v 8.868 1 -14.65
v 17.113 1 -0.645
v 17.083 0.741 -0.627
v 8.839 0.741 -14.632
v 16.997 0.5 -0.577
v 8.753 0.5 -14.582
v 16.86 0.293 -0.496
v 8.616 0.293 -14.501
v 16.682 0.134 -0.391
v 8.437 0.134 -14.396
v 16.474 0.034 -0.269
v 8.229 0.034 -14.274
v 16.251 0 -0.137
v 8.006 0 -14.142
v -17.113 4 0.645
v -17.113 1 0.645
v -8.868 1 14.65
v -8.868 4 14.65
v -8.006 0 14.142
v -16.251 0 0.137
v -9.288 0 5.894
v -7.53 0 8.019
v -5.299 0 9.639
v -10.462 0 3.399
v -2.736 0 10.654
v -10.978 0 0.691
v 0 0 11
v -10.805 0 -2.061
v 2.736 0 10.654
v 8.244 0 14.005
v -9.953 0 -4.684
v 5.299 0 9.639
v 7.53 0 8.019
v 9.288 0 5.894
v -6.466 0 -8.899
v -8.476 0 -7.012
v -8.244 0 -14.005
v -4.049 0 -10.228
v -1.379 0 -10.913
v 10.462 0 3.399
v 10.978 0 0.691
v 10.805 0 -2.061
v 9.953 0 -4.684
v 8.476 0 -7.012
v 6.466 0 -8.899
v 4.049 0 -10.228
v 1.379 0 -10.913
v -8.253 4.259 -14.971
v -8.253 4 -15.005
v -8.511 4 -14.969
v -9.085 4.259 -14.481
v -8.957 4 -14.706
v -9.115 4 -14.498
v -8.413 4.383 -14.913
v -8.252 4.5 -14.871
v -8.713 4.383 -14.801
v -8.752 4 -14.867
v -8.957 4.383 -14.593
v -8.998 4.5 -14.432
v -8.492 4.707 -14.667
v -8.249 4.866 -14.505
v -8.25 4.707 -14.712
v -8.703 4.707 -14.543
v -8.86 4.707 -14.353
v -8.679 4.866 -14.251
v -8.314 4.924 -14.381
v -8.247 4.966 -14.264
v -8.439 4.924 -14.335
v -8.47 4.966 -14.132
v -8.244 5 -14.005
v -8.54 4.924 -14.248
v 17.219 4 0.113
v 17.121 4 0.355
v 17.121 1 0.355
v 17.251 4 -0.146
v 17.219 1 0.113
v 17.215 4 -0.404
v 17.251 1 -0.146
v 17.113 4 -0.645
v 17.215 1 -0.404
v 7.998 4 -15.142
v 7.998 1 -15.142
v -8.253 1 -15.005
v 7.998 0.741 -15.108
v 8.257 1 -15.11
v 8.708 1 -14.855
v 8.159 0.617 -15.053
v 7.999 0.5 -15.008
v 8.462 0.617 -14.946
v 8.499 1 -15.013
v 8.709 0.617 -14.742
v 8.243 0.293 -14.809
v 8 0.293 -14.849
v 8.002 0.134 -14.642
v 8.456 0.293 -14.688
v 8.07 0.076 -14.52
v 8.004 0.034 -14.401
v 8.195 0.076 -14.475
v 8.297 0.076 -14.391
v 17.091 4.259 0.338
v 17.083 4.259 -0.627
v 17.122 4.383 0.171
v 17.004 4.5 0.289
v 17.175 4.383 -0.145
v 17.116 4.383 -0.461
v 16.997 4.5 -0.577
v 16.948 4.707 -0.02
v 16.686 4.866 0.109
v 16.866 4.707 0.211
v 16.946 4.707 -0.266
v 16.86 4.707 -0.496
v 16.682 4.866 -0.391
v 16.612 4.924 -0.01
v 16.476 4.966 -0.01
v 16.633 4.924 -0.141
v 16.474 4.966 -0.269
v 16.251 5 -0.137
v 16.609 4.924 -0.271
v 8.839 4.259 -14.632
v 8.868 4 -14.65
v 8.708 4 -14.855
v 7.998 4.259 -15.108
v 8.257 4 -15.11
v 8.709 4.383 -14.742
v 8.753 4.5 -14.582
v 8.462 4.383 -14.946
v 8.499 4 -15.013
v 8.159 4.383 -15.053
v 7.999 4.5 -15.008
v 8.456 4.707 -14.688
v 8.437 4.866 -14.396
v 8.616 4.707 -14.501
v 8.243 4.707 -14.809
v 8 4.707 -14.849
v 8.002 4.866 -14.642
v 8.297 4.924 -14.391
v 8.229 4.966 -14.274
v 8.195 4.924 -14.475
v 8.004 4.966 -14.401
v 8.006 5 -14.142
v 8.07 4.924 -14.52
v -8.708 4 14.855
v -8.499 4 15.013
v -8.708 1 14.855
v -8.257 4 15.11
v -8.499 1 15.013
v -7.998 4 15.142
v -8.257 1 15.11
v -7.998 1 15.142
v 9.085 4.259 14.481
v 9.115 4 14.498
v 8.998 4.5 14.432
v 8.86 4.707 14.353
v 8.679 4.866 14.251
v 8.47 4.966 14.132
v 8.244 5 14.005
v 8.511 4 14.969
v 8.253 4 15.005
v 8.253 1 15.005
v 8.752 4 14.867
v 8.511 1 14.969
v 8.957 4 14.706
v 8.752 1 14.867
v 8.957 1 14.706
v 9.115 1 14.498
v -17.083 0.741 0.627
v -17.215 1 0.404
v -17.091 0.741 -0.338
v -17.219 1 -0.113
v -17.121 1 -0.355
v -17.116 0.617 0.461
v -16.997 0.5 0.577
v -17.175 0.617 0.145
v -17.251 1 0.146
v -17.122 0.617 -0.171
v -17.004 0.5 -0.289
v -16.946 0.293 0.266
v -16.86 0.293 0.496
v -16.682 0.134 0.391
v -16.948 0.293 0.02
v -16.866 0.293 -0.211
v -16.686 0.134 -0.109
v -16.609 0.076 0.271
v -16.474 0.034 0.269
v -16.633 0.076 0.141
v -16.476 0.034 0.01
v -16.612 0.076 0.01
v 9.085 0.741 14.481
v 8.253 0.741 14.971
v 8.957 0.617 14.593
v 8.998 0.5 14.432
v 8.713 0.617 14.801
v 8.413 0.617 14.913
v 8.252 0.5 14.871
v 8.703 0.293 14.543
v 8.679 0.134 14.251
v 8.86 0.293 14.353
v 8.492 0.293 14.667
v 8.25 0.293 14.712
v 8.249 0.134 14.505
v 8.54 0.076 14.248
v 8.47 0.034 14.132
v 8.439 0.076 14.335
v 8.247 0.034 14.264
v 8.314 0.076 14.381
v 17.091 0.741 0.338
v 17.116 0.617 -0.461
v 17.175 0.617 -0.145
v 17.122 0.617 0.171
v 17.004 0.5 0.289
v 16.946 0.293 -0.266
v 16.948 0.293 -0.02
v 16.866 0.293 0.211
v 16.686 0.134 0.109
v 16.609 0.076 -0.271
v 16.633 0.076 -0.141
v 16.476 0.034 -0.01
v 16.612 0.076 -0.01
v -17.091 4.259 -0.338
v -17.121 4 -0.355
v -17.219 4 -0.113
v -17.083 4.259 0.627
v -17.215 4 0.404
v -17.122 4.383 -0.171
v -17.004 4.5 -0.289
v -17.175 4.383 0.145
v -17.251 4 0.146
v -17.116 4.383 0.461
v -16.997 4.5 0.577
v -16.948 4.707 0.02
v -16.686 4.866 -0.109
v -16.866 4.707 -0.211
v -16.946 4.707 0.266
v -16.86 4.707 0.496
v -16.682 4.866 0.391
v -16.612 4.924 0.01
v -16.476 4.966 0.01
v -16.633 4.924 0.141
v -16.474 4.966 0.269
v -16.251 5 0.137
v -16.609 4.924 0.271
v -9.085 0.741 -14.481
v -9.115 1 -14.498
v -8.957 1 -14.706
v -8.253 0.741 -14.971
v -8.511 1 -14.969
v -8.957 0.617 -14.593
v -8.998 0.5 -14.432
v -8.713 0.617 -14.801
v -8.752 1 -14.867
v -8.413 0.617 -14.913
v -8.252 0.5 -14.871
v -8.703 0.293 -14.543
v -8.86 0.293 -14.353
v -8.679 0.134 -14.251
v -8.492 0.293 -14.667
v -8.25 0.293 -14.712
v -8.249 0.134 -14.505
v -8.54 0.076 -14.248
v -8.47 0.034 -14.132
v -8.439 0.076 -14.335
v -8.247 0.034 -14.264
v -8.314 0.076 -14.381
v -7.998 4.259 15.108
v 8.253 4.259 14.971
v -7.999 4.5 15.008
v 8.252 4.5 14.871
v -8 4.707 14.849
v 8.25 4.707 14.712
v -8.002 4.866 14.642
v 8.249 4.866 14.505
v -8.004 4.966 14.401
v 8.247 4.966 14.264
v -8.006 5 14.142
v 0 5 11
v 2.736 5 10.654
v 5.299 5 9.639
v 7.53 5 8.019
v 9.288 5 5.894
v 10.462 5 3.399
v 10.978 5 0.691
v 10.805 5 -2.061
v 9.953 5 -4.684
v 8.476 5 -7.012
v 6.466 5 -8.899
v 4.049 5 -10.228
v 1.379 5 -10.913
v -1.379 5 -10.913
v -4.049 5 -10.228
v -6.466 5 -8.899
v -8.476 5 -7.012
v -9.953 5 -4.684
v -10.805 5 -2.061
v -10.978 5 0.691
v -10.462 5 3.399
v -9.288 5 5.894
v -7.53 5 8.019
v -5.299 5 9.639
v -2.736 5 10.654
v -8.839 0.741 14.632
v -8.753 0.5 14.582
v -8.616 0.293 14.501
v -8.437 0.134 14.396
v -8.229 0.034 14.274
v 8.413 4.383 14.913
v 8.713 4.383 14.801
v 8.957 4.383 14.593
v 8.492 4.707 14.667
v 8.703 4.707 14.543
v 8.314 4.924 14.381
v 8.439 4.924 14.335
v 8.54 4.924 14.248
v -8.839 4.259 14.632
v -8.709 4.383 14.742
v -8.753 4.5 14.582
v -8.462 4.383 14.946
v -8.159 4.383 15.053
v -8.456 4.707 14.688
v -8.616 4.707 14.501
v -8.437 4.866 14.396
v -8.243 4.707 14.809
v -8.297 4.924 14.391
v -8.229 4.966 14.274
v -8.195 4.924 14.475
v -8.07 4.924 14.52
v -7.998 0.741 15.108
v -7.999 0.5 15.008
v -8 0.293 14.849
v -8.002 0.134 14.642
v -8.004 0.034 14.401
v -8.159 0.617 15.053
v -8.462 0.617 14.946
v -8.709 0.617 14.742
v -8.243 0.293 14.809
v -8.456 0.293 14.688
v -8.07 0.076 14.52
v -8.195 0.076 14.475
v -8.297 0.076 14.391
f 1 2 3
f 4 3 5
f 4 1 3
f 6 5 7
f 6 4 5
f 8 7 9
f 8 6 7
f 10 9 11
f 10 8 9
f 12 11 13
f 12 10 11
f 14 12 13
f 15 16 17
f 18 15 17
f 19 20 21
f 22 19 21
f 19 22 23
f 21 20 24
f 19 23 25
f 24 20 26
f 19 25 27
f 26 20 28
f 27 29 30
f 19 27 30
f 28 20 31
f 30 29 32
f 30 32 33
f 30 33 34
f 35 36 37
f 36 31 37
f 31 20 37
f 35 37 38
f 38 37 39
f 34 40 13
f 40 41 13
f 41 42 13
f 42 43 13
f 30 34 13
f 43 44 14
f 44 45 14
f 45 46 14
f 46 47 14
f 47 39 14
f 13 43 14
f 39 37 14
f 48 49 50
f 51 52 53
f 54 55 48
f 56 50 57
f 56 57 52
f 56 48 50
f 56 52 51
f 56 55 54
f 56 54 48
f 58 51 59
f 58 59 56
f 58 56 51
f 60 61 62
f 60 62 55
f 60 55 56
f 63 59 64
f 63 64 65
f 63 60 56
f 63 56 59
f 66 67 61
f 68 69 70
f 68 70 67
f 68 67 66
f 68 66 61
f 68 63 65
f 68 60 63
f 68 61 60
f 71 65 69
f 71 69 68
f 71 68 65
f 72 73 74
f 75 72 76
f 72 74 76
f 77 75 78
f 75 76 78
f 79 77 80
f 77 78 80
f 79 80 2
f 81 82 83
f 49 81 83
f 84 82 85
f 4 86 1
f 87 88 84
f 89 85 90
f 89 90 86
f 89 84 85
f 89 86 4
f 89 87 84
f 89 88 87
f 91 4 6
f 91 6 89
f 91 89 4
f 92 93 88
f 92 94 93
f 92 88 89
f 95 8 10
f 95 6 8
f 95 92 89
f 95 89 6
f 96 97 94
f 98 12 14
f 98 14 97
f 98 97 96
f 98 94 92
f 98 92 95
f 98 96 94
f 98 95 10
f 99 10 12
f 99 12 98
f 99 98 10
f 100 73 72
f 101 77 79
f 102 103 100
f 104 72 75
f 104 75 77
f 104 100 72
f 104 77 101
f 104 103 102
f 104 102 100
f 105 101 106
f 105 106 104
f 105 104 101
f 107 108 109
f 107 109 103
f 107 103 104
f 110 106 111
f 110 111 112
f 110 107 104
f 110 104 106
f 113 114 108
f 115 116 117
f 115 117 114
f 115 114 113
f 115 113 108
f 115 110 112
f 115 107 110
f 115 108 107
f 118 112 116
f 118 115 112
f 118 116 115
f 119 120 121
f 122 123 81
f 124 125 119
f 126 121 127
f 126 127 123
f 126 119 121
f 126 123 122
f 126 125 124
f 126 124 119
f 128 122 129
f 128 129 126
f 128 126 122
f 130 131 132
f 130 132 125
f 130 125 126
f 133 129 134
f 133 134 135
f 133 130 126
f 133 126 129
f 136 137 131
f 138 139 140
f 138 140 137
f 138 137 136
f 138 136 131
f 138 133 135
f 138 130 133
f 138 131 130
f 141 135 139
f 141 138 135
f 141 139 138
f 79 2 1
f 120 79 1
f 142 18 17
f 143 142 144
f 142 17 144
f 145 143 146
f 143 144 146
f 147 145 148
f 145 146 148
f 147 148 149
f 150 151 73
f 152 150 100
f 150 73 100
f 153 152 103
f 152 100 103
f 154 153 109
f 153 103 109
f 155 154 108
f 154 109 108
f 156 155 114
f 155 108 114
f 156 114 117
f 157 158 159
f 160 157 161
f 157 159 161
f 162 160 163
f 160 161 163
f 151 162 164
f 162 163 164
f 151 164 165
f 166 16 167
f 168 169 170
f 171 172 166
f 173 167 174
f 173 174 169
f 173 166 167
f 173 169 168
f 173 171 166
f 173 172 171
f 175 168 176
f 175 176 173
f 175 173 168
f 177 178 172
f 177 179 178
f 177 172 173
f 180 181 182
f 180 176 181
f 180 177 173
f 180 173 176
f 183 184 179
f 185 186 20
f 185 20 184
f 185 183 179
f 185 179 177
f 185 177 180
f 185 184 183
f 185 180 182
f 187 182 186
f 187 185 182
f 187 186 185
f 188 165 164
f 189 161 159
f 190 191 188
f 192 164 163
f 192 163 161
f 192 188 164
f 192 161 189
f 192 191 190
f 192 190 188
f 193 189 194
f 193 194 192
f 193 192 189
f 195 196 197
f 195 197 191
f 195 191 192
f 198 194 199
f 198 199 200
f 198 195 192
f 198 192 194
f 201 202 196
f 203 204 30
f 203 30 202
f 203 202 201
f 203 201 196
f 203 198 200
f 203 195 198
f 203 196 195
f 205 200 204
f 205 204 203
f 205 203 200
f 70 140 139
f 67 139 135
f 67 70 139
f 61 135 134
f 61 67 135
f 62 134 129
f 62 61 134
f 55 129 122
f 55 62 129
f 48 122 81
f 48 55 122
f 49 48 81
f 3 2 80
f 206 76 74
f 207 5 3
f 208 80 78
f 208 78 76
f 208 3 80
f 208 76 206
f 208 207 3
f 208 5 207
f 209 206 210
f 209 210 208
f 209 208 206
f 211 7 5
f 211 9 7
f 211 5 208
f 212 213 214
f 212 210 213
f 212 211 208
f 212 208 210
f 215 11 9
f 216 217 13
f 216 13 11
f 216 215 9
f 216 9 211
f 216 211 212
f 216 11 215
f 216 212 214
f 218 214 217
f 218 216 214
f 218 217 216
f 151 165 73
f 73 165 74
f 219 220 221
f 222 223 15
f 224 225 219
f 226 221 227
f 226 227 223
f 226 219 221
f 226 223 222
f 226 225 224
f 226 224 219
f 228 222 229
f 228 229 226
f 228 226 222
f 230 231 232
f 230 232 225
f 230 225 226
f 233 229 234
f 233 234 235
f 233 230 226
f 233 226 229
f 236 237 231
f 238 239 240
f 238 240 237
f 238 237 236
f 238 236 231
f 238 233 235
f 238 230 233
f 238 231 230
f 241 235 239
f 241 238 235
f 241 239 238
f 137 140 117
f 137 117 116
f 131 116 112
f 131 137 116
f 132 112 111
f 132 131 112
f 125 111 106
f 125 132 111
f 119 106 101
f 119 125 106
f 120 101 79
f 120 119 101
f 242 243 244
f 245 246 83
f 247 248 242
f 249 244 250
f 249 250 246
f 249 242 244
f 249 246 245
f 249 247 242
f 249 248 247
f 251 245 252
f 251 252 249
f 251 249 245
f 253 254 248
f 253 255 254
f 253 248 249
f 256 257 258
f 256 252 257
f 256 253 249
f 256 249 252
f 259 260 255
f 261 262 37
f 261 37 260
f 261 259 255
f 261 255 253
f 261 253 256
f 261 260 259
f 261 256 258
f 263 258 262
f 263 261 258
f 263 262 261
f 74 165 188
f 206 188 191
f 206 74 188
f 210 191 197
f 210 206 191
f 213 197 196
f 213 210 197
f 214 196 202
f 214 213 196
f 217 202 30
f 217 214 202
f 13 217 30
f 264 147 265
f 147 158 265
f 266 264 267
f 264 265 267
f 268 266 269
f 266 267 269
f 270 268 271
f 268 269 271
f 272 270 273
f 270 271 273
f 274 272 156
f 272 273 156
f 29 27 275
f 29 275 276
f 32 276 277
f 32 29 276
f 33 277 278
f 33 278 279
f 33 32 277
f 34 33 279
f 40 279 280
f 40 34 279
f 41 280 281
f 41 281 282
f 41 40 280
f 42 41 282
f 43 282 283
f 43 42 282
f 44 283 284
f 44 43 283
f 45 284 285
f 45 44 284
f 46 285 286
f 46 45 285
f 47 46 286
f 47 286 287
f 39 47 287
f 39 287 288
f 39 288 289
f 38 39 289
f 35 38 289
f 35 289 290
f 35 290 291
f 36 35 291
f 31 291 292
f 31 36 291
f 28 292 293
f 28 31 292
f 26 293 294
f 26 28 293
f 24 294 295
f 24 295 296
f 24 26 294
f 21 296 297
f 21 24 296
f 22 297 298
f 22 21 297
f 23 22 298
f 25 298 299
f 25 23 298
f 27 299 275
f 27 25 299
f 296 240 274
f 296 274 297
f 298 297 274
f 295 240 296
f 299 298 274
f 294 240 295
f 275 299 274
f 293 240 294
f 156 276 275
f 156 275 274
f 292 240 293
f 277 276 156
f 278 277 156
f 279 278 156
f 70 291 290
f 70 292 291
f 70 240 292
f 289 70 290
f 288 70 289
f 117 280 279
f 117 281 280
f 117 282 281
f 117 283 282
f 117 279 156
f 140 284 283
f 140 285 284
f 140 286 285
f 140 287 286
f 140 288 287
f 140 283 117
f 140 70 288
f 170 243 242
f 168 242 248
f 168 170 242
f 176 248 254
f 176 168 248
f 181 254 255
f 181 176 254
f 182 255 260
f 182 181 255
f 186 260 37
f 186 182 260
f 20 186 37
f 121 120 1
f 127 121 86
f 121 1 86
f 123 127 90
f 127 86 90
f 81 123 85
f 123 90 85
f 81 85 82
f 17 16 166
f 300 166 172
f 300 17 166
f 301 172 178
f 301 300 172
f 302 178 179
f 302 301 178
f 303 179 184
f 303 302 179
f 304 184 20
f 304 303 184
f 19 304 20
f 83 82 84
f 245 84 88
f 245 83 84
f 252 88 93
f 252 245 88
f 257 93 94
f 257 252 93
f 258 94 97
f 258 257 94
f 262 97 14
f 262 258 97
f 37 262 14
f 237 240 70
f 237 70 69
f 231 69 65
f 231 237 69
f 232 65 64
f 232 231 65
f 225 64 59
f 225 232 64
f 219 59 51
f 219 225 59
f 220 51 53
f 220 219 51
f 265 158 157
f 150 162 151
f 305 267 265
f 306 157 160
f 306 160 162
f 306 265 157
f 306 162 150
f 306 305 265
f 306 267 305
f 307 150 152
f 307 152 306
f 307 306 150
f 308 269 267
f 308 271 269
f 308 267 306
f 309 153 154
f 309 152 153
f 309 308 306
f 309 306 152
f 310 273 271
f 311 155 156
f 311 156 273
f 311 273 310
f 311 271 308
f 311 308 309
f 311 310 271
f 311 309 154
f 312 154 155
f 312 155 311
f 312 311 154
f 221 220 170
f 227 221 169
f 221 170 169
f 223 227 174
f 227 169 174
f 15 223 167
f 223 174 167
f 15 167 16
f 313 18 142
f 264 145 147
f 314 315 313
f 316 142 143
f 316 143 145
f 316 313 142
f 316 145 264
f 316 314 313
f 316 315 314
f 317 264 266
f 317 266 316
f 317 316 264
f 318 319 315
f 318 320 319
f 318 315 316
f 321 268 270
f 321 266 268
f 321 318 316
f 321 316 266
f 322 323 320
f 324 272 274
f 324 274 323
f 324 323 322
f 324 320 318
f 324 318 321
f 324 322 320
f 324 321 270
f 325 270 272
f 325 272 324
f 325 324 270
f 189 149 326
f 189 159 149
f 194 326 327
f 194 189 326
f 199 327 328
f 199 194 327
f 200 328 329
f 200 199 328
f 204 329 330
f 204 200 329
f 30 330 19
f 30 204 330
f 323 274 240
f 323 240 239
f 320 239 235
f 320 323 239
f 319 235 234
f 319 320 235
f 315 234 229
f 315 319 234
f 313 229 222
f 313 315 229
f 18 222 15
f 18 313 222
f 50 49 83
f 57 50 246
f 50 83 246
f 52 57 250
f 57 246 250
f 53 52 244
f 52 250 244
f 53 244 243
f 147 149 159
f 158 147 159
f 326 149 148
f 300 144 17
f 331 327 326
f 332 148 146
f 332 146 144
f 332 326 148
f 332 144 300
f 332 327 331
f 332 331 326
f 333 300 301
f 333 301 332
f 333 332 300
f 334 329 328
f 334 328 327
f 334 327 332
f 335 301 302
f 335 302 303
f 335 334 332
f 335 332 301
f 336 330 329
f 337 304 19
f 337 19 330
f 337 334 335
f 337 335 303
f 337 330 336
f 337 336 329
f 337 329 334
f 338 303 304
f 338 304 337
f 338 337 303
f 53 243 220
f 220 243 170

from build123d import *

# Parameters (mm, degrees)
SKETCH1_R           = 11
BOSS_EXTRUDE1_DEPTH = 5
FILLET1_R           = 1
FILLET2_R           = 1
FILLET3_R           = 1
FILLET4_R           = 1
FILLET5_R           = 1
FILLET6_R           = 1
FILLET7_R           = 1
FILLET8_R           = 1


with BuildPart() as part:
    # Sketch1 → Boss-Extrude1 (new body)
    with BuildSketch(Plane(origin=(0, 0, 0), x_dir=(1, 0, 0), z_dir=(0, 1, 0))):
        Polygon((8.83016903, -15), (17.405465572, 0.1471507), (8.575296542, 15.1471507), (-8.83016903, 15), (-17.405465572, -0.1471507), (-8.575296542, -15.1471507), align=None)
        with Locations(Location((0, 0, 0), (0, 0, 270))):
            Circle(SKETCH1_R, mode=Mode.SUBTRACT)
    extrude(amount=BOSS_EXTRUDE1_DEPTH)

    # Fillet1
    fillet1_edges = [part.edges().sort_by_distance(p)[0] for p in [
        (-12.990381057, 0, 7.6471507),
        (-13.117817301, 0, -7.42642465),
        (-0.127436244, 0, -15.07357535),
        (12.990381057, 0, -7.6471507),
        (13.117817301, 0, 7.42642465),
        (0.127436244, 0, 15.07357535),
    ]]
    fillet(fillet1_edges, radius=FILLET1_R)

    # Fillet2
    fillet2_edges = [part.edges().sort_by_distance(p)[0] for p in [
        (12.990381057, 5, -7.6471507),
        (-0.127436244, 5, -15.07357535),
        (-13.117817301, 5, -7.42642465),
        (-12.990381057, 5, 7.6471507),
        (0.127436244, 5, 15.07357535),
        (13.117817301, 5, 7.42642465),
    ]]
    fillet(fillet2_edges, radius=FILLET2_R)

    # Fillet3
    # the kernel refuses this fillet: 1 mm, written as the material it takes off along each edge
    with BuildSketch(Plane(origin=(8.244385414, 1, 14.004916643), x_dir=(0.870221445448491, 0, 0.4926607716081514), z_dir=(0, -1, 0))) as fillet3_piece_1_section:
        Polygon((0, 0), (FILLET3_R, 0), (FILLET3_R, FILLET3_R * 0.57735026919), (FILLET3_R * 0.5, FILLET3_R * 0.866025403784), align=None)
    fillet3_piece_1 = extrude(amount=FILLET3_R, mode=Mode.PRIVATE)
    fillet3_piece_1 = fillet3_piece_1 - Plane(origin=(8.244385414, 1, 14.004916643), x_dir=(-0.5073034928723316, 0, -0.8617674663849478), z_dir=(0, -1, 0)) * Sphere(FILLET3_R, mode=Mode.PRIVATE)
    add(fillet3_piece_1, mode=Mode.SUBTRACT)
    with BuildSketch(Plane(origin=(8.244385414, 4, 14.004916643), x_dir=(0.870221445448491, 0, 0.4926607716081514), z_dir=(0, 1, 0))) as fillet3_piece_2_section:
        Polygon((0, 0), (FILLET3_R, 0), (FILLET3_R, -FILLET3_R * 0.57735026919), (FILLET3_R * 0.5, -FILLET3_R * 0.866025403784), align=None)
    fillet3_piece_2 = extrude(amount=FILLET3_R, mode=Mode.PRIVATE)
    fillet3_piece_2 = fillet3_piece_2 - Plane(origin=(8.244385414, 4, 14.004916643), x_dir=(-0.5073034928723316, 0, -0.8617674663849478), z_dir=(0, 1, 0)) * Sphere(FILLET3_R, mode=Mode.PRIVATE)
    add(fillet3_piece_2, mode=Mode.SUBTRACT)
    with BuildSketch(Plane(origin=(8.83016903, 1, 15), x_dir=(0.4926607716081517, 0, -0.8702214454484907), z_dir=(0, 1, 0))) as fillet3_piece_3:
        with BuildLine():
            CenterArc((FILLET3_R * 0.57735026919, FILLET3_R), FILLET3_R, 210, 60)
            Line((-FILLET3_R * 0.288675134595, FILLET3_R * 0.5), (0, 0))
            Line((0, 0), (FILLET3_R * 0.57735026919, 0))
        make_face()
    extrude(amount=3, mode=Mode.SUBTRACT)

    # Fillet4
    # the kernel refuses this fillet: 1 mm, written as the material it takes off along each edge
    with BuildSketch(Plane(origin=(-8.006420883, 1, 14.142305528), x_dir=(0.008453979063543083, 0, 0.999964264480483), z_dir=(0, -1, 0))) as fillet4_piece_1_section:
        Polygon((0, 0), (FILLET4_R, 0), (FILLET4_R, FILLET4_R * 0.57735026919), (FILLET4_R * 0.5, FILLET4_R * 0.866025403784), align=None)
    fillet4_piece_1 = extrude(amount=FILLET4_R, mode=Mode.PRIVATE)
    fillet4_piece_1 = fillet4_piece_1 - Plane(origin=(-8.006420883, 1, 14.142305528), x_dir=(0.49266077160815147, 0, -0.870221445448491), z_dir=(0, -1, 0)) * Sphere(FILLET4_R, mode=Mode.PRIVATE)
    add(fillet4_piece_1, mode=Mode.SUBTRACT)
    with BuildSketch(Plane(origin=(-8.006420883, 4, 14.142305528), x_dir=(0.008453979063543083, 0, 0.999964264480483), z_dir=(0, 1, 0))) as fillet4_piece_2_section:
        Polygon((0, 0), (FILLET4_R, 0), (FILLET4_R, -FILLET4_R * 0.57735026919), (FILLET4_R * 0.5, -FILLET4_R * 0.866025403784), align=None)
    fillet4_piece_2 = extrude(amount=FILLET4_R, mode=Mode.PRIVATE)
    fillet4_piece_2 = fillet4_piece_2 - Plane(origin=(-8.006420883, 4, 14.142305528), x_dir=(0.49266077160815147, 0, -0.870221445448491), z_dir=(0, 1, 0)) * Sphere(FILLET4_R, mode=Mode.PRIVATE)
    add(fillet4_piece_2, mode=Mode.SUBTRACT)
    with BuildSketch(Plane(origin=(-8.575296542, 1, 15.1471507), x_dir=(0.9999642644804829, 0, -0.008453979063542578), z_dir=(0, 1, 0))) as fillet4_piece_3:
        with BuildLine():
            CenterArc((FILLET4_R * 0.57735026919, FILLET4_R), FILLET4_R, 210, 60)
            Line((-FILLET4_R * 0.288675134595, FILLET4_R * 0.5), (0, 0))
            Line((0, 0), (FILLET4_R * 0.57735026919, 0))
        make_face()
    extrude(amount=3, mode=Mode.SUBTRACT)

    # Fillet5
    # the kernel refuses this fillet: 1 mm, written as the material it takes off along each edge
    with BuildSketch(Plane(origin=(-16.250806297, 1, 0.137388886), x_dir=(-0.870221445448491, 0, -0.49266077160815136), z_dir=(0, -1, 0))) as fillet5_piece_1_section:
        Polygon((0, 0), (FILLET5_R, 0), (FILLET5_R, -FILLET5_R * 0.57735026919), (FILLET5_R * 0.5, -FILLET5_R * 0.866025403784), align=None)
    fillet5_piece_1 = extrude(amount=FILLET5_R, mode=Mode.PRIVATE)
    fillet5_piece_1 = fillet5_piece_1 - Plane(origin=(-16.250806297, 1, 0.137388886), x_dir=(0.9999642644804829, 0, -0.008453979063543034), z_dir=(0, -1, 0)) * Sphere(FILLET5_R, mode=Mode.PRIVATE)
    add(fillet5_piece_1, mode=Mode.SUBTRACT)
    with BuildSketch(Plane(origin=(-16.250806297, 4, 0.137388886), x_dir=(-0.870221445448491, 0, -0.49266077160815136), z_dir=(0, 1, 0))) as fillet5_piece_2_section:
        Polygon((0, 0), (FILLET5_R, 0), (FILLET5_R, FILLET5_R * 0.57735026919), (FILLET5_R * 0.5, FILLET5_R * 0.866025403784), align=None)
    fillet5_piece_2 = extrude(amount=FILLET5_R, mode=Mode.PRIVATE)
    fillet5_piece_2 = fillet5_piece_2 - Plane(origin=(-16.250806297, 4, 0.137388886), x_dir=(0.9999642644804829, 0, -0.008453979063543034), z_dir=(0, 1, 0)) * Sphere(FILLET5_R, mode=Mode.PRIVATE)
    add(fillet5_piece_2, mode=Mode.SUBTRACT)
    with BuildSketch(Plane(origin=(-17.405465572, 1, 0.1471507), x_dir=(0.4926607716081488, 0, -0.8702214454484924), z_dir=(0, 1, 0))) as fillet5_piece_3:
        with BuildLine():
            CenterArc((FILLET5_R * 0.57735026919, -FILLET5_R), FILLET5_R, 90, 60)
            Line((-FILLET5_R * 0.288675134595, -FILLET5_R * 0.5), (0, 0))
            Line((0, 0), (FILLET5_R * 0.57735026919, 0))
        make_face()
    extrude(amount=3, mode=Mode.SUBTRACT)

    # Fillet6
    # the kernel refuses this fillet: 1 mm, written as the material it takes off along each edge
    with BuildSketch(Plane(origin=(-8.244385414, 1, -14.004916643), x_dir=(-0.008453979063543077, 0, -0.9999642644804829), z_dir=(0, -1, 0))) as fillet6_piece_1_section:
        Polygon((0, 0), (FILLET6_R, 0), (FILLET6_R, -FILLET6_R * 0.57735026919), (FILLET6_R * 0.5, -FILLET6_R * 0.866025403784), align=None)
    fillet6_piece_1 = extrude(amount=FILLET6_R, mode=Mode.PRIVATE)
    fillet6_piece_1 = fillet6_piece_1 - Plane(origin=(-8.244385414, 1, -14.004916643), x_dir=(0.5073034928723316, 0, 0.8617674663849478), z_dir=(0, -1, 0)) * Sphere(FILLET6_R, mode=Mode.PRIVATE)
    add(fillet6_piece_1, mode=Mode.SUBTRACT)
    with BuildSketch(Plane(origin=(-8.244385414, 4, -14.004916643), x_dir=(-0.008453979063543077, 0, -0.9999642644804829), z_dir=(0, 1, 0))) as fillet6_piece_2_section:
        Polygon((0, 0), (FILLET6_R, 0), (FILLET6_R, FILLET6_R * 0.57735026919), (FILLET6_R * 0.5, FILLET6_R * 0.866025403784), align=None)
    fillet6_piece_2 = extrude(amount=FILLET6_R, mode=Mode.PRIVATE)
    fillet6_piece_2 = fillet6_piece_2 - Plane(origin=(-8.244385414, 4, -14.004916643), x_dir=(0.5073034928723316, 0, 0.8617674663849478), z_dir=(0, 1, 0)) * Sphere(FILLET6_R, mode=Mode.PRIVATE)
    add(fillet6_piece_2, mode=Mode.SUBTRACT)
    with BuildSketch(Plane(origin=(-8.83016903, 1, -15), x_dir=(0.9999642644804829, 0, -0.008453979063542578), z_dir=(0, 1, 0))) as fillet6_piece_3:
        with BuildLine():
            CenterArc((FILLET6_R * 0.57735026919, -FILLET6_R), FILLET6_R, 90, 60)
            Line((-FILLET6_R * 0.288675134595, -FILLET6_R * 0.5), (0, 0))
            Line((0, 0), (FILLET6_R * 0.57735026919, 0))
        make_face()
    extrude(amount=3, mode=Mode.SUBTRACT)

    # Fillet7
    # the kernel refuses this fillet: 1 mm, written as the material it takes off along each edge
    with BuildSketch(Plane(origin=(8.006420883, 1, -14.142305528), x_dir=(0.8617674663849478, 0, -0.5073034928723317), z_dir=(0, -1, 0))) as fillet7_piece_1_section:
        Polygon((0, 0), (FILLET7_R, 0), (FILLET7_R, -FILLET7_R * 0.57735026919), (FILLET7_R * 0.5, -FILLET7_R * 0.866025403784), align=None)
    fillet7_piece_1 = extrude(amount=FILLET7_R, mode=Mode.PRIVATE)
    fillet7_piece_1 = fillet7_piece_1 - Plane(origin=(8.006420883, 1, -14.142305528), x_dir=(-0.4926607716081513, 0, 0.870221445448491), z_dir=(0, -1, 0)) * Sphere(FILLET7_R, mode=Mode.PRIVATE)
    add(fillet7_piece_1, mode=Mode.SUBTRACT)
    with BuildSketch(Plane(origin=(8.006420883, 4, -14.142305528), x_dir=(0.8617674663849478, 0, -0.5073034928723317), z_dir=(0, 1, 0))) as fillet7_piece_2_section:
        Polygon((0, 0), (FILLET7_R, 0), (FILLET7_R, FILLET7_R * 0.57735026919), (FILLET7_R * 0.5, FILLET7_R * 0.866025403784), align=None)
    fillet7_piece_2 = extrude(amount=FILLET7_R, mode=Mode.PRIVATE)
    fillet7_piece_2 = fillet7_piece_2 - Plane(origin=(8.006420883, 4, -14.142305528), x_dir=(-0.4926607716081513, 0, 0.870221445448491), z_dir=(0, 1, 0)) * Sphere(FILLET7_R, mode=Mode.PRIVATE)
    add(fillet7_piece_2, mode=Mode.SUBTRACT)
    with BuildSketch(Plane(origin=(8.575296542, 1, -15.1471507), x_dir=(0.507303492872331, 0, 0.8617674663849483), z_dir=(0, 1, 0))) as fillet7_piece_3:
        with BuildLine():
            CenterArc((FILLET7_R * 0.57735026919, -FILLET7_R), FILLET7_R, 90, 60)
            Line((-FILLET7_R * 0.288675134595, -FILLET7_R * 0.5), (0, 0))
            Line((0, 0), (FILLET7_R * 0.57735026919, 0))
        make_face()
    extrude(amount=3, mode=Mode.SUBTRACT)

    # Fillet8
    # the kernel refuses this fillet: 1 mm, written as the material it takes off along each edge
    with BuildSketch(Plane(origin=(16.250806297, 1, -0.137388886), x_dir=(0.870221445448491, 0, 0.4926607716081514), z_dir=(0, -1, 0))) as fillet8_piece_1_section:
        Polygon((0, 0), (FILLET8_R, 0), (FILLET8_R, -FILLET8_R * 0.57735026919), (FILLET8_R * 0.5, -FILLET8_R * 0.866025403784), align=None)
    fillet8_piece_1 = extrude(amount=FILLET8_R, mode=Mode.PRIVATE)
    fillet8_piece_1 = fillet8_piece_1 - Plane(origin=(16.250806297, 1, -0.137388886), x_dir=(-0.9999642644804829, 0, 0.00845397906354313), z_dir=(0, -1, 0)) * Sphere(FILLET8_R, mode=Mode.PRIVATE)
    add(fillet8_piece_1, mode=Mode.SUBTRACT)
    with BuildSketch(Plane(origin=(16.250806297, 4, -0.137388886), x_dir=(0.870221445448491, 0, 0.4926607716081514), z_dir=(0, 1, 0))) as fillet8_piece_2_section:
        Polygon((0, 0), (FILLET8_R, 0), (FILLET8_R, FILLET8_R * 0.57735026919), (FILLET8_R * 0.5, FILLET8_R * 0.866025403784), align=None)
    fillet8_piece_2 = extrude(amount=FILLET8_R, mode=Mode.PRIVATE)
    fillet8_piece_2 = fillet8_piece_2 - Plane(origin=(16.250806297, 4, -0.137388886), x_dir=(-0.9999642644804829, 0, 0.00845397906354313), z_dir=(0, 1, 0)) * Sphere(FILLET8_R, mode=Mode.PRIVATE)
    add(fillet8_piece_2, mode=Mode.SUBTRACT)
    with BuildSketch(Plane(origin=(17.405465572, 1, -0.1471507), x_dir=(-0.4926607716081509, 0, 0.8702214454484912), z_dir=(0, 1, 0))) as fillet8_piece_3:
        with BuildLine():
            CenterArc((FILLET8_R * 0.57735026919, -FILLET8_R), FILLET8_R, 90, 60)
            Line((-FILLET8_R * 0.288675134595, -FILLET8_R * 0.5), (0, 0))
            Line((0, 0), (FILLET8_R * 0.57735026919, 0))
        make_face()
    extrude(amount=3, mode=Mode.SUBTRACT)


solid = part.part
